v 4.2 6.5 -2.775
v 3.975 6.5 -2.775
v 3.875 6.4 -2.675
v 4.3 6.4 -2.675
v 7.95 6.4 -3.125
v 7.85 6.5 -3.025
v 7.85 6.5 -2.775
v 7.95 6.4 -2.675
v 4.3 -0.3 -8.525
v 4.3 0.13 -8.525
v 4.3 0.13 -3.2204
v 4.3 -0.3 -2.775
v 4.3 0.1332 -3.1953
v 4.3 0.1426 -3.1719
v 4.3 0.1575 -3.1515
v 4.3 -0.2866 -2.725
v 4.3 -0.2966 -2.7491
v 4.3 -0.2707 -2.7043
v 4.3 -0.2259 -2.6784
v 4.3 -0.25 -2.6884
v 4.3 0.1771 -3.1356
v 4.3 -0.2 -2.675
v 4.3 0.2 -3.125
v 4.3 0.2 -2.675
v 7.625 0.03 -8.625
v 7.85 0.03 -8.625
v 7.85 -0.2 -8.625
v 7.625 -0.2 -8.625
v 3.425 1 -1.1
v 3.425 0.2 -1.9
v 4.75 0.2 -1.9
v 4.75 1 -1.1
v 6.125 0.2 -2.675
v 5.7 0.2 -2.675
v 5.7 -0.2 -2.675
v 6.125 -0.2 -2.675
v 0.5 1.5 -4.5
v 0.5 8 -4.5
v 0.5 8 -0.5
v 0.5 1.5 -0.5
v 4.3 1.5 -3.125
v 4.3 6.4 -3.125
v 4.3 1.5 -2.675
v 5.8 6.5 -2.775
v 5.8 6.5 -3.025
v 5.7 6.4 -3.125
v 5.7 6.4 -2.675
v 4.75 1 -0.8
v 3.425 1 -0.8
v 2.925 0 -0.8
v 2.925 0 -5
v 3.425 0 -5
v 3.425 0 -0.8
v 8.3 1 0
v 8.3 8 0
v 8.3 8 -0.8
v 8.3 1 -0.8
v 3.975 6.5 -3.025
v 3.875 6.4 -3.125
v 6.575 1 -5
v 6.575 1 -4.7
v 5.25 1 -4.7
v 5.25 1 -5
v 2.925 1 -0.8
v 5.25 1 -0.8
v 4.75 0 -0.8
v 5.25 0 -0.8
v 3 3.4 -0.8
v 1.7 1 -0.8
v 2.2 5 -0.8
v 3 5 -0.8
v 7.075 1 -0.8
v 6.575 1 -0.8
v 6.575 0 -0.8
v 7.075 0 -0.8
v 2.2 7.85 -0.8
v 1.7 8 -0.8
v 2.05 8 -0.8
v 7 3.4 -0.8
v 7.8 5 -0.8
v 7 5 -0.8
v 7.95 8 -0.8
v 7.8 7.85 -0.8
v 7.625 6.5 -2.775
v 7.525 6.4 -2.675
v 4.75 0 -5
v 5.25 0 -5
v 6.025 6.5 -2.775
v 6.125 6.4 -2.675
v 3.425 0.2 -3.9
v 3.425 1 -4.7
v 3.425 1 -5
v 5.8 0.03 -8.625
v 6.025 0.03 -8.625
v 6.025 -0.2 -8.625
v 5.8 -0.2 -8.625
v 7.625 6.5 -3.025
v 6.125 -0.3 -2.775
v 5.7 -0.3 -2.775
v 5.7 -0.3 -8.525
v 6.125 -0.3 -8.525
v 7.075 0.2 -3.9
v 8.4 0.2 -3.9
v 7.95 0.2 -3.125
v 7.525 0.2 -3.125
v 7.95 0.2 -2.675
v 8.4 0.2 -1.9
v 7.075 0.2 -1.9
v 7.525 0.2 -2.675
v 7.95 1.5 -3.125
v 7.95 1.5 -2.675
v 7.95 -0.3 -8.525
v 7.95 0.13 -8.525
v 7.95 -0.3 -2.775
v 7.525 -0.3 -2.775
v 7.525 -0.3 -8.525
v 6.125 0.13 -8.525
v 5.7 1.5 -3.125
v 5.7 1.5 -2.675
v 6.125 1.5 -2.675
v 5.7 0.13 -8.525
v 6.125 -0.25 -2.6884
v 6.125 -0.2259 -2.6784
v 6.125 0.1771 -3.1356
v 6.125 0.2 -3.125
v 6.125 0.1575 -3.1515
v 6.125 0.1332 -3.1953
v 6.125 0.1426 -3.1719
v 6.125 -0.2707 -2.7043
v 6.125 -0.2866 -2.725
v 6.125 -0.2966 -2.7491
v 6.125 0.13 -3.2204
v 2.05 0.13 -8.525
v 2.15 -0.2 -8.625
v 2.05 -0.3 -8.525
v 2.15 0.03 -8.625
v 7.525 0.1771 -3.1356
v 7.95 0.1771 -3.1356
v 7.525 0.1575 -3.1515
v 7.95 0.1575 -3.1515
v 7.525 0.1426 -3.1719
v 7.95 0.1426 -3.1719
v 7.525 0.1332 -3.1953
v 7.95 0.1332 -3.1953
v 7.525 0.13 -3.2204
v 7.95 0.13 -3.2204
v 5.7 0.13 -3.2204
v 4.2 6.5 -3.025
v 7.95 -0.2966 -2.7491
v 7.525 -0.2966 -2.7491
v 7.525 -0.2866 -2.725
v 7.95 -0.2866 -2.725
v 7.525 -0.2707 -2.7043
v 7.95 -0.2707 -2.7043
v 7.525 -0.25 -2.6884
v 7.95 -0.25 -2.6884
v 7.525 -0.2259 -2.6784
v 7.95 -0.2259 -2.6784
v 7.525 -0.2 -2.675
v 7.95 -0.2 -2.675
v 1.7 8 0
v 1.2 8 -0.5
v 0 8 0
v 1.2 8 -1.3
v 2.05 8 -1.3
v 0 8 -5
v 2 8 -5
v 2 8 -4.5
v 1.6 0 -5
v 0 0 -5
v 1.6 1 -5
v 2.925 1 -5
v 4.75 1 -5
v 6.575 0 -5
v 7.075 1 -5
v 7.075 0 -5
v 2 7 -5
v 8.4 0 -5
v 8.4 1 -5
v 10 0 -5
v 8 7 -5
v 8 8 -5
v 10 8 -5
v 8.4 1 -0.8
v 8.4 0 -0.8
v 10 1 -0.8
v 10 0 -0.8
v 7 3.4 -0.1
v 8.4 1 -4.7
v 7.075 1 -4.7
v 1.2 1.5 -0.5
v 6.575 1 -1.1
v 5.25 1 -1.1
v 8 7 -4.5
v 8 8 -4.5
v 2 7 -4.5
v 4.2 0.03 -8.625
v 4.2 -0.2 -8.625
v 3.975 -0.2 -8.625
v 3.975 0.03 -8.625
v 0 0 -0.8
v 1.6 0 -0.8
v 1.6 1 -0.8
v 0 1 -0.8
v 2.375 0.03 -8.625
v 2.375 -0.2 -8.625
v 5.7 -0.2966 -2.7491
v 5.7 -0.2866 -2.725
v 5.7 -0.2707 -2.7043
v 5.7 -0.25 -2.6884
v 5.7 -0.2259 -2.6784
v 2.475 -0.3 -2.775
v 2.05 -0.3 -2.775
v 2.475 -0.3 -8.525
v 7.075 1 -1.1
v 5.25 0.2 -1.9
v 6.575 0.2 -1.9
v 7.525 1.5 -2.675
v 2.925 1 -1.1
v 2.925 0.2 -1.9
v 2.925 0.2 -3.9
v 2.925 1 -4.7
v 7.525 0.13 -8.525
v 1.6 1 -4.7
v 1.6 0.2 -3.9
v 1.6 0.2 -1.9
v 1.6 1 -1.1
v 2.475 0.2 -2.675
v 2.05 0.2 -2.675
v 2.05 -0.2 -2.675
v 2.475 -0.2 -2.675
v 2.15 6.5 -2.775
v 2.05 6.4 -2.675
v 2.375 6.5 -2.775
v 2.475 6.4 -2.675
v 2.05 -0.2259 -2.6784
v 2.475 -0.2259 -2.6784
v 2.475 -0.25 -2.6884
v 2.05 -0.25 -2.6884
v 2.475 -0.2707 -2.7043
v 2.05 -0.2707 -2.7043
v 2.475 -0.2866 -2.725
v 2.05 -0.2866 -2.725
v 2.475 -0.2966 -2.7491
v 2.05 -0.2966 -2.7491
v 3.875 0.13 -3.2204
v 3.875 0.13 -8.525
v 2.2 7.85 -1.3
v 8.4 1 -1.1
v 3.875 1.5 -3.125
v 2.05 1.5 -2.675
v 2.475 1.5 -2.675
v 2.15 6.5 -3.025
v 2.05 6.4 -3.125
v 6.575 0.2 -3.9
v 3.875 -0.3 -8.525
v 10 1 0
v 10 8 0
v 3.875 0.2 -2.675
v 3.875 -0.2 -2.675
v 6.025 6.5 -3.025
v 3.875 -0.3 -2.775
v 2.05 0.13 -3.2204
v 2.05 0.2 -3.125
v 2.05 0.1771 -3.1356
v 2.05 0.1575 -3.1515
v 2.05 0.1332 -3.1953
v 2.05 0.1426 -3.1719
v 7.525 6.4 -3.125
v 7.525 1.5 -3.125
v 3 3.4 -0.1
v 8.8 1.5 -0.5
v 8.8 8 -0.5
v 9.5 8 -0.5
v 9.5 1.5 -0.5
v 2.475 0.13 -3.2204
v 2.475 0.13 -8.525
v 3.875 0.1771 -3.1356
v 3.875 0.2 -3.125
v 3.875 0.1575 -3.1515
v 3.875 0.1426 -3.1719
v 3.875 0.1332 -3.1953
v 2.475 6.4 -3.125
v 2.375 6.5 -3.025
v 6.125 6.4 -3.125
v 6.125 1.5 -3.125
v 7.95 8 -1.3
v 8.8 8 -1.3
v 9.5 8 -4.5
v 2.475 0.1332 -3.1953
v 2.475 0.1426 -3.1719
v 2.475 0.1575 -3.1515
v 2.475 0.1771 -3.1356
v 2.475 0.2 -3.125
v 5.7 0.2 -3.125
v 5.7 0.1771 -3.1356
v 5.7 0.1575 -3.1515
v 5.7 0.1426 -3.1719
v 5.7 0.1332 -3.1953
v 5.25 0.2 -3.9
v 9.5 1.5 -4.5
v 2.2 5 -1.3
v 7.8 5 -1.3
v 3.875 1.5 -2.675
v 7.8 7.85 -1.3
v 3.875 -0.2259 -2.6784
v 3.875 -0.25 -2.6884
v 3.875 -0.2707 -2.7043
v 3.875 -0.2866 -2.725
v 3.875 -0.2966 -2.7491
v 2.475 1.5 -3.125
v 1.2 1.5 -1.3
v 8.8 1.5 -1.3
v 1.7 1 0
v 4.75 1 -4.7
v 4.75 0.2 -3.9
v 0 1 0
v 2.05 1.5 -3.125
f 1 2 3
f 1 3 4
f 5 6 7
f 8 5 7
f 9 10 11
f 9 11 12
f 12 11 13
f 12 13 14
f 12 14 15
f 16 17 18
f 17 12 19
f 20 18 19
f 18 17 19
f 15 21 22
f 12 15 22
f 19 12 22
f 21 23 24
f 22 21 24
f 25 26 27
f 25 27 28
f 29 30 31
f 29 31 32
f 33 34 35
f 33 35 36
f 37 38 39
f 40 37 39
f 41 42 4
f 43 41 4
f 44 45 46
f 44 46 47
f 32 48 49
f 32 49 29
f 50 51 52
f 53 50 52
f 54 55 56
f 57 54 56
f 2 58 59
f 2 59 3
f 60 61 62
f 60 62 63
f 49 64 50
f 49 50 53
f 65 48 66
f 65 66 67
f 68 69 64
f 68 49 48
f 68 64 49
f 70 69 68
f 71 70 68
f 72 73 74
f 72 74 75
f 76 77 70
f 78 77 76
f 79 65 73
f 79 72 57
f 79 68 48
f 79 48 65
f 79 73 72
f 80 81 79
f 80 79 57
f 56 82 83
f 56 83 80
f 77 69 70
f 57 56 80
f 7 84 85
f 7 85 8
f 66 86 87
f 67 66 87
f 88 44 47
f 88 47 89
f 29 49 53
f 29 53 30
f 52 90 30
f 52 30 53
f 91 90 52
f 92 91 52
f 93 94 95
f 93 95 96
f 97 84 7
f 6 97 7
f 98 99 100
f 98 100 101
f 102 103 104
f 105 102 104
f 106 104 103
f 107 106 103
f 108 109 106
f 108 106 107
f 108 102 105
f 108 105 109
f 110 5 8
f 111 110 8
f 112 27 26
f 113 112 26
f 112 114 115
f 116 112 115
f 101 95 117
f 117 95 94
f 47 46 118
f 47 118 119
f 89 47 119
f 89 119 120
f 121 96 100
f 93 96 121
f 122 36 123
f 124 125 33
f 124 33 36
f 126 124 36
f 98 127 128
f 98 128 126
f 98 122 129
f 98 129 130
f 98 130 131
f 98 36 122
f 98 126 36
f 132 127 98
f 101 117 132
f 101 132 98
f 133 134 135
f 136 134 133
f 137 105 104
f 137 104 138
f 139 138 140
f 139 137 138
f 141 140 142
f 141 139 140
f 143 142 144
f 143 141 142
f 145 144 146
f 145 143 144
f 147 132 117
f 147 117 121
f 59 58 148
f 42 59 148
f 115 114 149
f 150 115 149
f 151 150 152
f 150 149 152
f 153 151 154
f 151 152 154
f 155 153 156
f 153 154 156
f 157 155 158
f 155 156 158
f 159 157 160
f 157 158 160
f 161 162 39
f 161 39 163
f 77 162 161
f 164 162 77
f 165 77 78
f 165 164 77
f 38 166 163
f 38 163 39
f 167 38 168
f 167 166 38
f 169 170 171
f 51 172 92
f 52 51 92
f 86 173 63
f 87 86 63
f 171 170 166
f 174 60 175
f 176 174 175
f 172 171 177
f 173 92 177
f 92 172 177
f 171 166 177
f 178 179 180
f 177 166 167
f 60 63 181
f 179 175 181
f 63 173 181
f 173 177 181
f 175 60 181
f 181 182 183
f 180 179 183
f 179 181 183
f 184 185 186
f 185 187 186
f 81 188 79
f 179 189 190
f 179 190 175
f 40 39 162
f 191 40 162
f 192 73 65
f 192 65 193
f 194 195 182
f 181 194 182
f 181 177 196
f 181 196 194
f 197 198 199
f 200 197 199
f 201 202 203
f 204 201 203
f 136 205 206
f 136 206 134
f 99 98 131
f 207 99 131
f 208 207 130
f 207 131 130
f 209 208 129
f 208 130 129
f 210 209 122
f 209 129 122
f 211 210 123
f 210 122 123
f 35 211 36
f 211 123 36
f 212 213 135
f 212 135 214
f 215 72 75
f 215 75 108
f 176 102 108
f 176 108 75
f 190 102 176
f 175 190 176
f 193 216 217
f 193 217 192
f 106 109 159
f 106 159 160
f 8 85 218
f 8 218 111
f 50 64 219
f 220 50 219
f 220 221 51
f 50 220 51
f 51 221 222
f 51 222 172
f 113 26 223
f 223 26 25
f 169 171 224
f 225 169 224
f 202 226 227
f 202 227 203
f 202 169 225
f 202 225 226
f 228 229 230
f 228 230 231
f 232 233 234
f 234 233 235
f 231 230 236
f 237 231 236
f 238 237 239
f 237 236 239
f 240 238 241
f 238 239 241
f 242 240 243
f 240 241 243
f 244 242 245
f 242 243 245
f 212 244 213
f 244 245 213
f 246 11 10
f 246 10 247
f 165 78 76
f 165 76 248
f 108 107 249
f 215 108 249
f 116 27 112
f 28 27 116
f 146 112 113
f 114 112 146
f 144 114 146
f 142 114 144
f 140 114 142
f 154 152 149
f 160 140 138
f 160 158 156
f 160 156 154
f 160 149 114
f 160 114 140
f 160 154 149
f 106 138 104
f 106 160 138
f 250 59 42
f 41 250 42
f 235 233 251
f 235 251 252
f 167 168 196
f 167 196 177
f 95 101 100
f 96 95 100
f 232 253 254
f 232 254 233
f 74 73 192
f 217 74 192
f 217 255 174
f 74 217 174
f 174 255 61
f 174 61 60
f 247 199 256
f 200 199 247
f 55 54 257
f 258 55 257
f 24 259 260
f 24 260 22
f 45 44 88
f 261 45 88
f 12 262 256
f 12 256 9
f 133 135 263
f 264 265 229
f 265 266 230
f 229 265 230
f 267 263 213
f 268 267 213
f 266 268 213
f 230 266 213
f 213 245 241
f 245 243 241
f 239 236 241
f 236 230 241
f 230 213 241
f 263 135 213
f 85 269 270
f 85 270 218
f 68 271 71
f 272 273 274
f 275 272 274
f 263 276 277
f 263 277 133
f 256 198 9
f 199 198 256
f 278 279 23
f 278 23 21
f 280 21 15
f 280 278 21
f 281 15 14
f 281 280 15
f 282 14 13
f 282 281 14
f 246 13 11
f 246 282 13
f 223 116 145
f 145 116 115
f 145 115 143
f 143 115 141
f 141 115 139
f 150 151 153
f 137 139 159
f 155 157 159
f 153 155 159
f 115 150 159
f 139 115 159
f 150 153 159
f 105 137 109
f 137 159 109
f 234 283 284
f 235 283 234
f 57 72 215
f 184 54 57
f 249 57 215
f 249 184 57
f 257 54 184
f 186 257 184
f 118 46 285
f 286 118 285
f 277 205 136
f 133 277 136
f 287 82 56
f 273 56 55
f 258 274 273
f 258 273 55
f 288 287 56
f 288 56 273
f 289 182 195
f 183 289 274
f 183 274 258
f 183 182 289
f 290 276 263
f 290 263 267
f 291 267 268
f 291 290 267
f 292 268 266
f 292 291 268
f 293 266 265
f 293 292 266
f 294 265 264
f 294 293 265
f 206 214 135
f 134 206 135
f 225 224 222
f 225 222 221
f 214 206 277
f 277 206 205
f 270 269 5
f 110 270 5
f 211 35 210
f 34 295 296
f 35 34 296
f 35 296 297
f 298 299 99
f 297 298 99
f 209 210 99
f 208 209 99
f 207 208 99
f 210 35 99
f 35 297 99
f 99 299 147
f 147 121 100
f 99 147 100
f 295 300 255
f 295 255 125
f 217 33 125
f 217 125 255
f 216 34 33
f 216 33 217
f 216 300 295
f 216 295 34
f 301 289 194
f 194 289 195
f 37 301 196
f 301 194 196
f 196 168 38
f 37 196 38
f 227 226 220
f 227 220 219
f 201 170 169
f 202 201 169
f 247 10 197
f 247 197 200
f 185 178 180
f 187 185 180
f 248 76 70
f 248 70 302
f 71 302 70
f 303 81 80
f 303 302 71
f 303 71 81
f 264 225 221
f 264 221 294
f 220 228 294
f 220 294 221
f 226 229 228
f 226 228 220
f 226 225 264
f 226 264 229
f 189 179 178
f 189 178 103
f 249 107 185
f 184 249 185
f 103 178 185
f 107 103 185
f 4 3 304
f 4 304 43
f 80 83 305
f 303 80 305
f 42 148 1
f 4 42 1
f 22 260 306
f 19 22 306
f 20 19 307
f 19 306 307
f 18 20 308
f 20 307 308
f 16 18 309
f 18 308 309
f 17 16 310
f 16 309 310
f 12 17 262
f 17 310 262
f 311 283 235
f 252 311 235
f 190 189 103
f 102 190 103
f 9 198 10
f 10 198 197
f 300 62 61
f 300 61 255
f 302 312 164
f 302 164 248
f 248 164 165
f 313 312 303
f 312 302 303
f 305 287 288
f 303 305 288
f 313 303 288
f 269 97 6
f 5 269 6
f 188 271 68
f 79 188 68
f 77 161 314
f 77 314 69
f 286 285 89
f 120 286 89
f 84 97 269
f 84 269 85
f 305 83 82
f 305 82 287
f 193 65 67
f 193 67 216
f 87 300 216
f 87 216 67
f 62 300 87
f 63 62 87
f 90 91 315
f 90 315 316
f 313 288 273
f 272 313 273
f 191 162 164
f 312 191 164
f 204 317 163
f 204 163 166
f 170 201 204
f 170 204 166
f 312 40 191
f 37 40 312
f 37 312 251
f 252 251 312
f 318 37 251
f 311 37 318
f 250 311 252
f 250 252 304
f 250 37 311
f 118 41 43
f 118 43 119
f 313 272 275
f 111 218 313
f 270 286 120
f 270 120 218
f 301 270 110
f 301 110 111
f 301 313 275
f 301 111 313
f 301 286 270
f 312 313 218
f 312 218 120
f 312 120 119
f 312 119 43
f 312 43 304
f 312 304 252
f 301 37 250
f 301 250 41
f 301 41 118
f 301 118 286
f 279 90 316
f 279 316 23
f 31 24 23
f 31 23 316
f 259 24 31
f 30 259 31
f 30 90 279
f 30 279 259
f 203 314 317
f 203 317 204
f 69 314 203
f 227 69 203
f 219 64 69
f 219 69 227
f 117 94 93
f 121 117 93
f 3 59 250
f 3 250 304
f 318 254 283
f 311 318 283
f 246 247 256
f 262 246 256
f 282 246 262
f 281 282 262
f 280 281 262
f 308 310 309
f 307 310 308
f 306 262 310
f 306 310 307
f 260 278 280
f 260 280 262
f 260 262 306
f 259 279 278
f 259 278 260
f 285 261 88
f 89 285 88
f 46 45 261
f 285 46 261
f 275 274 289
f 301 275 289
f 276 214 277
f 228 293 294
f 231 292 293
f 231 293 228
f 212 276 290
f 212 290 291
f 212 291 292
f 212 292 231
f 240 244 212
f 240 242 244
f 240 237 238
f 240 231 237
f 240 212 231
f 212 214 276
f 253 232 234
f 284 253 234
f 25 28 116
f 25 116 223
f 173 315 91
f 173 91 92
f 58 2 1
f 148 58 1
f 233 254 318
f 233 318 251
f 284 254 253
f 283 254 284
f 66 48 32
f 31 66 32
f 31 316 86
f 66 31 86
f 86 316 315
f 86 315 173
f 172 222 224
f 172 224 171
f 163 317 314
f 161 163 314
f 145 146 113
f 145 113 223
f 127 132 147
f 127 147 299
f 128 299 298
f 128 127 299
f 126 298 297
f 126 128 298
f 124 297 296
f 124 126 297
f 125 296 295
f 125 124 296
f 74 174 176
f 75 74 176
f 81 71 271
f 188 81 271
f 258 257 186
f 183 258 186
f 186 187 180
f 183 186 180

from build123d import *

# Parameters (mm, degrees)
ESQUISSE1_W             = 10
ESQUISSE1_H             = 5
BOSS_EXTRU_1_DEPTH      = 8
ESQUISSE2_W             = 6.6
ESQUISSE2_H             = 0.8
ENL_V_MAT_EXTRU_1_DEPTH = 8
ENL_V_MAT_EXTRU_2_DEPTH = 6.5
ESQUISSE5_W             = 6
ESQUISSE5_H             = 0.5
ENL_V_MAT_EXTRU_3_DEPTH = 1
ESQUISSE6_W             = 5.6
ESQUISSE6_H             = 0.5
ENL_V_MAT_EXTRU_4_DEPTH = 3
ESQUISSE7_W             = 0.8
ESQUISSE7_H             = 1
ENL_V_MAT_EXTRU_5_DEPTH = 10
ESQUISSE8_W             = 6.8
ESQUISSE8_H             = 4.2
ENL_V_MAT_EXTRU_6_DEPTH = 1
BOSS_EXTRU_2_DEPTH      = 6.8
BOSS_EXTRU_3_DEPTH      = 2
BOSS_EXTRU_3_DEPTH_BACK = 2
ESQUISSE12_W            = 0.5
ESQUISSE12_H            = 4.2
BOSS_EXTRU_4_DEPTH      = 1
CHANFREIN1_SIZE         = 0.15
BOSS_EXTRU_5_DEPTH      = 0.5
BOSS_EXTRU_5_DEPTH_BACK = 6.3
ESQUISSE13_W            = 0.425
ESQUISSE13_H            = 0.45
CHANFREIN2_SIZE         = 0.1
ESQUISSE14_W            = 0.425
ESQUISSE14_H            = 0.43
BOSS_EXTRU_6_DEPTH      = 5.5
CONG_1_R                = 0.1
CHANFREIN3_SIZE         = 0.1


with BuildPart() as part:
    # Esquisse1 → Boss.-Extru.1 (new body)
    with BuildSketch(Plane(origin=(0, 0, 0), x_dir=(1, 0, 0), z_dir=(0, 1, 0))):
        with Locations((5, 2.5)):
            Rectangle(ESQUISSE1_W, ESQUISSE1_H)
    extrude(amount=BOSS_EXTRU_1_DEPTH)

    # Esquisse2 → Enlèv. mat.-Extru.1 (cut)
    with BuildSketch(Plane(origin=(0, 8, 0), x_dir=(1, 0, 0), z_dir=(0, 1, 0))):
        with Locations((5, 0.4)):
            Rectangle(ESQUISSE2_W, ESQUISSE2_H)
    extrude(amount=-ENL_V_MAT_EXTRU_1_DEPTH, mode=Mode.SUBTRACT)

    # Esquisse4 → Enlèv. mat.-Extru.2 (cut)
    with BuildSketch(Plane(origin=(0, 8, 0), x_dir=(1, 0, 0), z_dir=(0, 1, 0))):
        Polygon((0.5, 0.5), (1.2, 0.5), (1.2, 1.3), (8.8, 1.3), (8.8, 0.5), (9.5, 0.5), (9.5, 4.5), (0.5, 4.5), align=None)
    extrude(amount=-ENL_V_MAT_EXTRU_2_DEPTH, mode=Mode.SUBTRACT)

    # Esquisse5 → Enlèv. mat.-Extru.3 (cut)
    with BuildSketch(Plane(origin=(0, 8, 0), x_dir=(1, 0, 0), z_dir=(0, 1, 0))):
        with Locations((5, 4.75)):
            Rectangle(ESQUISSE5_W, ESQUISSE5_H)
    extrude(amount=-ENL_V_MAT_EXTRU_3_DEPTH, mode=Mode.SUBTRACT)

    # Esquisse6 → Enlèv. mat.-Extru.4 (cut)
    with BuildSketch(Plane(origin=(0, 8, 0), x_dir=(1, 0, 0), z_dir=(0, 1, 0))):
        with Locations((5, 1.05)):
            Rectangle(ESQUISSE6_W, ESQUISSE6_H)
    extrude(amount=-ENL_V_MAT_EXTRU_4_DEPTH, mode=Mode.SUBTRACT)

    # Esquisse7 → Enlèv. mat.-Extru.5 (cut)
    with BuildSketch(Plane(origin=(10, 0, 0), x_dir=(0, 0, -1), z_dir=(1, 0, 0))):
        with Locations((0.4, 0.5)):
            Rectangle(ESQUISSE7_W, ESQUISSE7_H)
    extrude(amount=-ENL_V_MAT_EXTRU_5_DEPTH, mode=Mode.SUBTRACT)

    # Esquisse8 → Enlèv. mat.-Extru.6 (cut)
    with BuildSketch(Plane.XZ):
        with Locations((5, -2.9)):
            Rectangle(ESQUISSE8_W, ESQUISSE8_H)
    extrude(amount=-ENL_V_MAT_EXTRU_6_DEPTH, mode=Mode.SUBTRACT)

    # Esquisse9 → Boss.-Extru.2 (add)
    with BuildSketch(Plane(origin=(1.6, 0, 0), x_dir=(0, 0, -1), z_dir=(1, 0, 0))):
        Polygon((4.7, 1), (3.9, 0.2), (1.9, 0.2), (1.1, 1), align=None)
    extrude(amount=BOSS_EXTRU_2_DEPTH)

    # Esquisse11 → Boss.-Extru.3 (add, two sides: drawn at the far end of the back side and taken through both)
    with BuildSketch(Plane(origin=(5, 0, 0), x_dir=(0, 0, -1), z_dir=(1, 0, 0)).offset(-BOSS_EXTRU_3_DEPTH_BACK)):
        Polygon((0.8, 5), (0.1, 3.4), (0.8, 3.4), align=None)
    extrude(amount=BOSS_EXTRU_3_DEPTH + BOSS_EXTRU_3_DEPTH_BACK)

    # Esquisse12 → Boss.-Extru.4 (add)
    with BuildSketch(Plane(origin=(0, 1, 0), x_dir=(1, 0, 0), z_dir=(0, 1, 0))):
        with Locations((5, 2.9)):
            Rectangle(ESQUISSE12_W, ESQUISSE12_H)
        with Locations((3.175, 2.9)):
            Rectangle(ESQUISSE12_W, ESQUISSE12_H)
        with Locations((6.825, 2.9)):
            Rectangle(ESQUISSE12_W, ESQUISSE12_H)
    extrude(amount=-BOSS_EXTRU_4_DEPTH)

    # Chanfrein1
    chanfrein1_edges = [part.edges().sort_by_distance(p)[0] for p in [
        (2.2, 8, -1.05),
        (7.8, 8, -1.05),
    ]]
    chamfer(chanfrein1_edges, length=CHANFREIN1_SIZE)

    # Esquisse13 → Boss.-Extru.5 (add, two sides: drawn at the far end of the back side and taken through both)
    with BuildSketch(Plane.XZ.offset(-0.2).offset(-BOSS_EXTRU_5_DEPTH_BACK)):
        with Locations((2.2625, -2.9)):
            Rectangle(ESQUISSE13_W, ESQUISSE13_H)
        with Locations((4.0875, -2.9)):
            Rectangle(ESQUISSE13_W, ESQUISSE13_H)
        with Locations((5.9125, -2.9)):
            Rectangle(ESQUISSE13_W, ESQUISSE13_H)
        with Locations((7.7375, -2.9)):
            Rectangle(ESQUISSE13_W, ESQUISSE13_H)
    extrude(amount=BOSS_EXTRU_5_DEPTH + BOSS_EXTRU_5_DEPTH_BACK)

    # Chanfrein2
    chanfrein2_edges = [part.edges().sort_by_distance(p)[0] for p in [
        (2.05, 6.5, -2.9),
        (2.2625, 6.5, -2.675),
        (2.475, 6.5, -2.9),
        (2.2625, 6.5, -3.125),
        (4.3, 6.5, -2.9),
        (4.0875, 6.5, -3.125),
        (3.875, 6.5, -2.9),
        (4.0875, 6.5, -2.675),
        (5.7, 6.5, -2.9),
        (5.9125, 6.5, -2.675),
        (6.125, 6.5, -2.9),
        (5.9125, 6.5, -3.125),
        (7.7375, 6.5, -2.675),
        (7.95, 6.5, -2.9),
        (7.7375, 6.5, -3.125),
        (7.525, 6.5, -2.9),
    ]]
    chamfer(chanfrein2_edges, length=CHANFREIN2_SIZE)

    # Esquisse14 → Boss.-Extru.6 (add)
    with BuildSketch(Plane(origin=(0, 0, -3.125), x_dir=(-1, 0, 0), z_dir=(0, 0, -1))):
        with Locations((-7.7375, -0.085)):
            Rectangle(ESQUISSE14_W, ESQUISSE14_H)
        with Locations((-5.9125, -0.085)):
            Rectangle(ESQUISSE14_W, ESQUISSE14_H)
        with Locations((-4.0875, -0.085)):
            Rectangle(ESQUISSE14_W, ESQUISSE14_H)
        with Locations((-2.2625, -0.085)):
            Rectangle(ESQUISSE14_W, ESQUISSE14_H)
    extrude(amount=BOSS_EXTRU_6_DEPTH)

    # Congé1
    # the kernel refuses this fillet: 0.1 mm, written as the material it adds along each edge
    with BuildSketch(Plane(origin=(2.475, 0.13, -3.125), x_dir=(0, 0, -1), z_dir=(-1, 0, 0))) as cong_1_piece_1:
        with BuildLine():
            CenterArc((0.09539392, -0.1), CONG_1_R, 90, 72.542396876)
            Line((0, -0.07), (0, 0))
            Line((0, 0), (0.09539392, 0))
        make_face()
    extrude(amount=0.425)
    with BuildSketch(Plane(origin=(3.875, 0.13, -3.125), x_dir=(0, 0, -1), z_dir=(1, 0, 0)), Plane(origin=(7.525, 0.13, -3.125), x_dir=(0, 0, -1), z_dir=(1, 0, 0))) as cong_1_piece_2:
        with BuildLine():
            CenterArc((0.09539392, 0.1), CONG_1_R, 197.457603124, 72.542396876)
            Line((0, 0.07), (0, 0))
            Line((0, 0), (0.09539392, 0))
        make_face()
    extrude(amount=0.425)
    with BuildSketch(Plane(origin=(6.125, 0.13, -3.125), x_dir=(0, 1, 0), z_dir=(-1, 0, 0))) as cong_1_piece_3:
        with BuildLine():
            CenterArc((0.1, 0.09539392), CONG_1_R, 180, 72.542396876)
            Line((0, 0.09539392), (0, 0))
            Line((0, 0), (0.07, 0))
        make_face()
    extrude(amount=0.425)
    # the kernel refuses this fillet: 0.1 mm, written as the material it takes off along each edge
    with BuildSketch(Plane(origin=(1.8, -0.3, -2.675), x_dir=(0, 1, 0), z_dir=(1, 0, 0)), Plane(origin=(3.625, -0.3, -2.675), x_dir=(0, 1, 0), z_dir=(1, 0, 0))) as cong_1_2_piece_1:
        with BuildLine():
            CenterArc((CONG_1_R, -CONG_1_R), CONG_1_R, 90, 90)
            Line((0, -CONG_1_R), (0, 0))
            Line((0, 0), (CONG_1_R, 0))
        make_face()
    extrude(amount=0.925, mode=Mode.SUBTRACT)
    with BuildSketch(Plane(origin=(6.375, -0.3, -2.675), x_dir=(0, 1, 0), z_dir=(-1, 0, 0)), Plane(origin=(8.2, -0.3, -2.675), x_dir=(0, 1, 0), z_dir=(-1, 0, 0))) as cong_1_2_piece_2:
        with BuildLine():
            CenterArc((CONG_1_R, CONG_1_R), CONG_1_R, 180, 90)
            Line((0, CONG_1_R), (0, 0))
            Line((0, 0), (CONG_1_R, 0))
        make_face()
    extrude(amount=0.925, mode=Mode.SUBTRACT)

    # Chanfrein3
    chanfrein3_edges = [part.edges().sort_by_distance(p)[0] for p in [
        (7.95, -0.085, -8.625),
        (7.7375, -0.3, -8.625),
        (7.525, -0.085, -8.625),
        (7.7375, 0.13, -8.625),
        (5.7, -0.085, -8.625),
        (5.9125, 0.13, -8.625),
        (6.125, -0.085, -8.625),
        (5.9125, -0.3, -8.625),
        (4.3, -0.085, -8.625),
        (4.0875, -0.3, -8.625),
        (3.875, -0.085, -8.625),
        (4.0875, 0.13, -8.625),
        (2.05, -0.085, -8.625),
        (2.2625, 0.13, -8.625),
        (2.475, -0.085, -8.625),
        (2.2625, -0.3, -8.625),
    ]]
    chamfer(chanfrein3_edges, length=CHANFREIN3_SIZE)


solid = part.part
